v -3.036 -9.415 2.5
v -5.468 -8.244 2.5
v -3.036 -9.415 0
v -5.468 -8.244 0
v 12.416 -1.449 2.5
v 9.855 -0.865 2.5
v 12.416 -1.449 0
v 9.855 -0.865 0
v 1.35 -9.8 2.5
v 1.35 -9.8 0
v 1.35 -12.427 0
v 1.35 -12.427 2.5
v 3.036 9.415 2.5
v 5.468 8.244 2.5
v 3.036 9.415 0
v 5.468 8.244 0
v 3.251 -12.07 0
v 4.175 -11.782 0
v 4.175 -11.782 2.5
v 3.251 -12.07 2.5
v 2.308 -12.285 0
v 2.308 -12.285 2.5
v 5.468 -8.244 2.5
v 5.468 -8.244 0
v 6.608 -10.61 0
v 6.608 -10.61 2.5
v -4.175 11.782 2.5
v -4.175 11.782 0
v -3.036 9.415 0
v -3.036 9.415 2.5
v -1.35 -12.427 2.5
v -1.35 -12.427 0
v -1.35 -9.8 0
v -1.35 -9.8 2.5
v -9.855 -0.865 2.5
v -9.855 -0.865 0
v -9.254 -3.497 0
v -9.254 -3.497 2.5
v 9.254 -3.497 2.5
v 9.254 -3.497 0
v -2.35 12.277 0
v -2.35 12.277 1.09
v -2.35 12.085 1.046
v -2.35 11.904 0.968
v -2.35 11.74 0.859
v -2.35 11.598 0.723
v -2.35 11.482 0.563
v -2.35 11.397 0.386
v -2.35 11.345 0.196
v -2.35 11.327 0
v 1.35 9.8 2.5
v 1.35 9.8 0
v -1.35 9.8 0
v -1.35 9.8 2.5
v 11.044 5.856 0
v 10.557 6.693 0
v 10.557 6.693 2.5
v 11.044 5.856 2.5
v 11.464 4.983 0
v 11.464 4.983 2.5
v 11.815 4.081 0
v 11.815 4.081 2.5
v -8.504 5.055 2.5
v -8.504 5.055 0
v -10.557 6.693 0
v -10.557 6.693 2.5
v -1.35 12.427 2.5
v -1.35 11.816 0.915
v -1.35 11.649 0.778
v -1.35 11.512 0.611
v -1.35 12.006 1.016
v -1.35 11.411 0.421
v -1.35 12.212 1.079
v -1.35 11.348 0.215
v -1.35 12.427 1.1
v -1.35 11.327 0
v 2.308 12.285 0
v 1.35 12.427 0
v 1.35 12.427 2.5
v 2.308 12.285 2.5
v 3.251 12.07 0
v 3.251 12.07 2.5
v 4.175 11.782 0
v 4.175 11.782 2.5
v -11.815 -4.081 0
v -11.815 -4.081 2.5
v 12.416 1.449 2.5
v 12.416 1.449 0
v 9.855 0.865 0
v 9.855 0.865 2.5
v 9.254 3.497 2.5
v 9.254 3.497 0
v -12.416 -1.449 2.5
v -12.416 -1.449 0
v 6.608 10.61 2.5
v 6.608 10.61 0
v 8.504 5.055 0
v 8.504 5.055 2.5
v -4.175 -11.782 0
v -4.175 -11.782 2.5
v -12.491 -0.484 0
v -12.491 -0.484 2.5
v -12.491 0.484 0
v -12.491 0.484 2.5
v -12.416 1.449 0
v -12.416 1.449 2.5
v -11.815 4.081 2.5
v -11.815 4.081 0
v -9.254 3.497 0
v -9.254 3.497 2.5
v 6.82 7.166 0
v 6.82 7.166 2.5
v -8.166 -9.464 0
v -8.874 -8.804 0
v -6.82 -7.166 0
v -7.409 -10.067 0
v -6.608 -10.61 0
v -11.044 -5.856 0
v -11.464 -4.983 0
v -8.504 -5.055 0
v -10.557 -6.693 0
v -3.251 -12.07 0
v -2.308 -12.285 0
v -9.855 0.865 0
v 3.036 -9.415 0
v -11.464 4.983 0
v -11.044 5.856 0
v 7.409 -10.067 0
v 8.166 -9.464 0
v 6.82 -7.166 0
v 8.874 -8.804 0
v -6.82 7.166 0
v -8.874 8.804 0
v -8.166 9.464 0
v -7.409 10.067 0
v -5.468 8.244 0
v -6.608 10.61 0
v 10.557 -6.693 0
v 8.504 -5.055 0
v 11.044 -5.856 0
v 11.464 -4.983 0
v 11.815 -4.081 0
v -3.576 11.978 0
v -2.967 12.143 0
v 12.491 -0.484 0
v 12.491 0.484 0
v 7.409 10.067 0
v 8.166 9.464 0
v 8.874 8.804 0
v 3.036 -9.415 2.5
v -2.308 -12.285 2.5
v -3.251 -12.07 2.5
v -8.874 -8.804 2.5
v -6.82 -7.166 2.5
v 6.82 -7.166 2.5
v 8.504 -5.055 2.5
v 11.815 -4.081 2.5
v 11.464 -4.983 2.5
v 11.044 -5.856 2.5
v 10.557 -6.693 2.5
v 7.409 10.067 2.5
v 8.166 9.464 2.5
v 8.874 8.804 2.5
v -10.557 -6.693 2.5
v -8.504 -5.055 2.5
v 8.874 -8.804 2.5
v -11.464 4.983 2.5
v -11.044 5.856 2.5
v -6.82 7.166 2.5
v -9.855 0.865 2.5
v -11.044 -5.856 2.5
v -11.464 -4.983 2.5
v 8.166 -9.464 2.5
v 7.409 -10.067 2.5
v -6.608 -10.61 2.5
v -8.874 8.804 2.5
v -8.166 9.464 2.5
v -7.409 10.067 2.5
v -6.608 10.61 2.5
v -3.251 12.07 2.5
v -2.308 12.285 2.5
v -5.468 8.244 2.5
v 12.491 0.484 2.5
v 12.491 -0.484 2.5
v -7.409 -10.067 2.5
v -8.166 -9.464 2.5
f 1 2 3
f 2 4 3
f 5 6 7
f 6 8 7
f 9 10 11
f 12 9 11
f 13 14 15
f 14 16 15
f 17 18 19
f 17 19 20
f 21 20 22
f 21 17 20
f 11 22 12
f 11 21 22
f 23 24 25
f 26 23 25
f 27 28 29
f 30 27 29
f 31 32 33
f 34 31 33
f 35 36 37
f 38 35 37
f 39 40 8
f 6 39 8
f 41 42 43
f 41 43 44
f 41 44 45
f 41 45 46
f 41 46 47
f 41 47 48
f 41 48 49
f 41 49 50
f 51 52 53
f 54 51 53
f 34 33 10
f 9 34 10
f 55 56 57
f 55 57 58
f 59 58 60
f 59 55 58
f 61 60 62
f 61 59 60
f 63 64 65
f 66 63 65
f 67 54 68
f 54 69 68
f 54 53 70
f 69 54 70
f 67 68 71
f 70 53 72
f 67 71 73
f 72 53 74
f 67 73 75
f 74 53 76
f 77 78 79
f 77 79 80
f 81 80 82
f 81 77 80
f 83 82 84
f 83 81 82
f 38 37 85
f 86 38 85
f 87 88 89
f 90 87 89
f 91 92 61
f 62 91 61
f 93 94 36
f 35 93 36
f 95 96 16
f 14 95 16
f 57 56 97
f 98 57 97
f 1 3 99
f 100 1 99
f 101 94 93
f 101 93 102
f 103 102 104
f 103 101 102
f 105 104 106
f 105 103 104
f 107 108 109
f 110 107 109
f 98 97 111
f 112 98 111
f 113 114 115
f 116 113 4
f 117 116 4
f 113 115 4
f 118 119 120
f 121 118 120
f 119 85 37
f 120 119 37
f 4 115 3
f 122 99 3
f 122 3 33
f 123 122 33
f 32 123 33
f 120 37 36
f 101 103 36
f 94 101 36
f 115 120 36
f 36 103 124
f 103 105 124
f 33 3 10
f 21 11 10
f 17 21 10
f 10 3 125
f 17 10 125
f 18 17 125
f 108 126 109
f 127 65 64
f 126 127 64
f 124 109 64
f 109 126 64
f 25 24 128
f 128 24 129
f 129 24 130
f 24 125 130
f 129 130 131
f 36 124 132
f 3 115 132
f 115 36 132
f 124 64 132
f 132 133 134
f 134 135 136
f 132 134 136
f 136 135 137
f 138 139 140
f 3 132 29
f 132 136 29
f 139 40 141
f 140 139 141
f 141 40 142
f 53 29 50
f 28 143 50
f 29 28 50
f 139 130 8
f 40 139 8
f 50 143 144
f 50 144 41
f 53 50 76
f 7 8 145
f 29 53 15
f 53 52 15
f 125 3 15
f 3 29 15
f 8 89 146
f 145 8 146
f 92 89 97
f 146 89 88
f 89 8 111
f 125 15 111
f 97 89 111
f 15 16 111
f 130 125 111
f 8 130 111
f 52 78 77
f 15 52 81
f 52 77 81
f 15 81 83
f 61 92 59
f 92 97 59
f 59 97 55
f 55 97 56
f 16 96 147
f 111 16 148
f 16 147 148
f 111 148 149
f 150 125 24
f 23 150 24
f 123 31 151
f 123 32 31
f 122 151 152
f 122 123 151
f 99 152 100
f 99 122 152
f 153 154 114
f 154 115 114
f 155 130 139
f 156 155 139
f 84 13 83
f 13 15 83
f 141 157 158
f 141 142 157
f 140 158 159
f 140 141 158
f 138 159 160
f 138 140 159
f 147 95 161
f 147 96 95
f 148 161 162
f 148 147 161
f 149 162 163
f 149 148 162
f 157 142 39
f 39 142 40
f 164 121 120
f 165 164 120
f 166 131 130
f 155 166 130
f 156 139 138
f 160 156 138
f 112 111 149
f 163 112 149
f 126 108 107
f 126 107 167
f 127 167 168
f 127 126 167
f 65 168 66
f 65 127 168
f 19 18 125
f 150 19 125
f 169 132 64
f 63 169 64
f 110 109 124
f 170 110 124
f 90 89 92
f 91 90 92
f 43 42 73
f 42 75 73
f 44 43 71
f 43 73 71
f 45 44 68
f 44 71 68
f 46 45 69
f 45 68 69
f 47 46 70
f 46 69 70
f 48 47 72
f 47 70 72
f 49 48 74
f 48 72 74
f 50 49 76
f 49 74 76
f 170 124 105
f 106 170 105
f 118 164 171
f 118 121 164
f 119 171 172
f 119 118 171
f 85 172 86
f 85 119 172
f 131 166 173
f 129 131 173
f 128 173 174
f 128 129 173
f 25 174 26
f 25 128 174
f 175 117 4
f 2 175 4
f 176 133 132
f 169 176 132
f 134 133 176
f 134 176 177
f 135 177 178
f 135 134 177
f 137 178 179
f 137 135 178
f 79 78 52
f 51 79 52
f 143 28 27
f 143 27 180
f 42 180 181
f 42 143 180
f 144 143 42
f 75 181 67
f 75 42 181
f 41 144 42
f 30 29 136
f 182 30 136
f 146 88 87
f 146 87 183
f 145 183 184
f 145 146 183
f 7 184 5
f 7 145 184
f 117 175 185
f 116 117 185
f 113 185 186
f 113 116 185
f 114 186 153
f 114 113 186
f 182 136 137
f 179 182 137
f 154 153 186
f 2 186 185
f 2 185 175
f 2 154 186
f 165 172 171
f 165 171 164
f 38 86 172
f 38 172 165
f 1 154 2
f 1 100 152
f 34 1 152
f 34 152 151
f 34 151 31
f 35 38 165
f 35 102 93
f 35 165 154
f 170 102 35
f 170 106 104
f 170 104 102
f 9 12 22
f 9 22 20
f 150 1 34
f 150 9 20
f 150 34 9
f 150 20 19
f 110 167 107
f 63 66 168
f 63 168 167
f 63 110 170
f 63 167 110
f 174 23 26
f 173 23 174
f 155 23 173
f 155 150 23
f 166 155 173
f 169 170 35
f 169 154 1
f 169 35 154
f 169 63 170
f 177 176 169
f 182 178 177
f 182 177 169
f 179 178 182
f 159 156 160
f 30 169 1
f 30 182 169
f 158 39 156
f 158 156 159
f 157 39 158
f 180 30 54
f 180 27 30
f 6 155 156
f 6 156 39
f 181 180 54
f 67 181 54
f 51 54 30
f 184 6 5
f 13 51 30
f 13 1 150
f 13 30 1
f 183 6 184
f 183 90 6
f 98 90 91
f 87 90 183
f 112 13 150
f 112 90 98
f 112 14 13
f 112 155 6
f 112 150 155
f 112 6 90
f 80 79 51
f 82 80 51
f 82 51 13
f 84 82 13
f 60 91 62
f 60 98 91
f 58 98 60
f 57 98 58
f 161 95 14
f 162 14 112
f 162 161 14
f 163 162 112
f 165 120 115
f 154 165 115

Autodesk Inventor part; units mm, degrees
ref_plane "YZ Plane" through (0, 0, 0) normal (1, 0, 0) x (0, 1, 0)
ref_plane "XZ Plane" through (0, 0, 0) normal (0, 1, 0) x (-1, 0, 0)
ref_plane "XY Plane" through (0, 0, 0) normal (0, 0, 1) x (1, 0, 0)
sketch "スケッチ1" plane through (0, 0, 0) normal (0, 0, 1) x (1, 0, 0)
  circle A0 centre (0, 0) radius 12.5
  line L0 (-1.35, 12.5) -> (1.35, 12.5) construction
  line L1 (1.35, 12.5) -> (1.35, 9.8)
  line L2 (1.35, 9.8) -> (-1.35, 9.8)
  line L3 (-1.35, 9.8) -> (-1.35, 12.5)
  line L4 (-5.4684, 8.2438) -> (-6.6399, 10.6764)
  line L5 (-4.2072, 11.8479) -> (-3.0358, 9.4152)
  line L6 (-3.0358, 9.4152) -> (-5.4684, 8.2438)
  line L7 (-8.5037, 5.0547) -> (-10.6146, 6.7382)
  line L8 (-8.9312, 8.8491) -> (-6.8202, 7.1657)
  line L9 (-6.8202, 7.1657) -> (-8.5037, 5.0547)
  line L10 (-9.8547, 0.8646) -> (-12.487, 1.4654)
  line L11 (-11.8862, 4.0977) -> (-9.2539, 3.4969)
  line L12 (-9.2539, 3.4969) -> (-9.8547, 0.8646)
  line L13 (-9.2539, -3.4969) -> (-11.8862, -4.0977)
  line L14 (-12.487, -1.4654) -> (-9.8547, -0.8646)
  line L15 (-9.8547, -0.8646) -> (-9.2539, -3.4969)
  line L16 (-6.8202, -7.1657) -> (-8.9312, -8.8491)
  line L17 (-10.6146, -6.7382) -> (-8.5037, -5.0547)
  line L18 (-8.5037, -5.0547) -> (-6.8202, -7.1657)
  line L19 (-3.0358, -9.4152) -> (-4.2072, -11.8479)
  line L20 (-6.6399, -10.6764) -> (-5.4684, -8.2438)
  line L21 (-5.4684, -8.2438) -> (-3.0358, -9.4152)
  line L22 (1.35, -9.8) -> (1.35, -12.5)
  line L23 (-1.35, -12.5) -> (-1.35, -9.8)
  line L24 (-1.35, -9.8) -> (1.35, -9.8)
  line L25 (5.4684, -8.2438) -> (6.6399, -10.6764)
  line L26 (4.2072, -11.8479) -> (3.0358, -9.4152)
  line L27 (3.0358, -9.4152) -> (5.4684, -8.2438)
  line L28 (8.5037, -5.0547) -> (10.6146, -6.7382)
  line L29 (8.9312, -8.8491) -> (6.8202, -7.1657)
  line L30 (6.8202, -7.1657) -> (8.5037, -5.0547)
  line L31 (9.8547, -0.8646) -> (12.487, -1.4654)
  line L32 (11.8862, -4.0977) -> (9.2539, -3.4969)
  line L33 (9.2539, -3.4969) -> (9.8547, -0.8646)
  line L34 (9.2539, 3.4969) -> (11.8862, 4.0977)
  line L35 (12.487, 1.4654) -> (9.8547, 0.8646)
  line L36 (9.8547, 0.8646) -> (9.2539, 3.4969)
  line L37 (6.8202, 7.1657) -> (8.9312, 8.8491)
  line L38 (10.6146, 6.7382) -> (8.5037, 5.0547)
  line L39 (8.5037, 5.0547) -> (6.8202, 7.1657)
  line L40 (3.0358, 9.4152) -> (4.2072, 11.8479)
  line L41 (6.6399, 10.6764) -> (5.4684, 8.2438)
  line L42 (5.4684, 8.2438) -> (3.0358, 9.4152)
  point P0 (0, 12.5)
  point P1 (-1.35, 12.4269)
  point P2 (-4.1755, 11.782)
  point P3 (-6.6081, 10.6105)
  point P4 (-8.874, 8.8035)
  point P5 (-10.5574, 6.6926)
  point P6 (-11.8149, 4.0814)
  point P7 (-12.4157, 1.4491)
  point P8 (-12.4157, -1.4491)
  point P9 (-11.8149, -4.0814)
  point P10 (-10.5574, -6.6926)
  point P11 (-8.874, -8.8035)
  point P12 (-6.6081, -10.6105)
  point P13 (-4.1755, -11.782)
  point P14 (-1.35, -12.4269)
  point P15 (1.35, -12.4269)
  point P16 (4.1755, -11.782)
  point P17 (6.6081, -10.6105)
  point P18 (8.874, -8.8035)
  point P19 (10.5574, -6.6926)
  point P20 (11.8149, -4.0814)
  point P21 (12.4157, -1.4491)
  point P22 (12.4157, 1.4491)
  point P23 (11.8149, 4.0814)
  point P24 (1.35, 12.4269)
  point P25 (10.5574, 6.6926)
  point P26 (8.874, 8.8035)
  point P27 (6.6081, 10.6105)
  point P28 (4.1755, 11.782)
  dimension "d0" = 25
  dimension "d3" = 2.7
  dimension "d4" = 2.7
  dimension "d7" = 360
extrude "押し出し2" add sketch "スケッチ1" along normal blind 2.5 contours A0 L31 L33 L32 L28 L30 L29 L25 L27 L26 L22 L24 L23 L19 L21 L20 L16 L18 L17 L13 L15 L14 L10 L12 L11 L7 L9 L8 L4 L6 L5 L3 L2 L1 L40 L42 L41 L37 L39 L38 L34 L36 L35
sketch "スケッチ2" plane through (-1.35, 9.8, 0) normal (1, 0, 0) x (0, 0, -1)
  line L0 (0, 0) -> (0, 2.6269) projected
  circle A0 centre (0, 2.6269) radius 1.1
  point P0 (0, -9.8)
  dimension "d11" = 2.2
extrude "押し出し3" cut sketch "スケッチ2" against normal blind 1
properties part number "frame"
